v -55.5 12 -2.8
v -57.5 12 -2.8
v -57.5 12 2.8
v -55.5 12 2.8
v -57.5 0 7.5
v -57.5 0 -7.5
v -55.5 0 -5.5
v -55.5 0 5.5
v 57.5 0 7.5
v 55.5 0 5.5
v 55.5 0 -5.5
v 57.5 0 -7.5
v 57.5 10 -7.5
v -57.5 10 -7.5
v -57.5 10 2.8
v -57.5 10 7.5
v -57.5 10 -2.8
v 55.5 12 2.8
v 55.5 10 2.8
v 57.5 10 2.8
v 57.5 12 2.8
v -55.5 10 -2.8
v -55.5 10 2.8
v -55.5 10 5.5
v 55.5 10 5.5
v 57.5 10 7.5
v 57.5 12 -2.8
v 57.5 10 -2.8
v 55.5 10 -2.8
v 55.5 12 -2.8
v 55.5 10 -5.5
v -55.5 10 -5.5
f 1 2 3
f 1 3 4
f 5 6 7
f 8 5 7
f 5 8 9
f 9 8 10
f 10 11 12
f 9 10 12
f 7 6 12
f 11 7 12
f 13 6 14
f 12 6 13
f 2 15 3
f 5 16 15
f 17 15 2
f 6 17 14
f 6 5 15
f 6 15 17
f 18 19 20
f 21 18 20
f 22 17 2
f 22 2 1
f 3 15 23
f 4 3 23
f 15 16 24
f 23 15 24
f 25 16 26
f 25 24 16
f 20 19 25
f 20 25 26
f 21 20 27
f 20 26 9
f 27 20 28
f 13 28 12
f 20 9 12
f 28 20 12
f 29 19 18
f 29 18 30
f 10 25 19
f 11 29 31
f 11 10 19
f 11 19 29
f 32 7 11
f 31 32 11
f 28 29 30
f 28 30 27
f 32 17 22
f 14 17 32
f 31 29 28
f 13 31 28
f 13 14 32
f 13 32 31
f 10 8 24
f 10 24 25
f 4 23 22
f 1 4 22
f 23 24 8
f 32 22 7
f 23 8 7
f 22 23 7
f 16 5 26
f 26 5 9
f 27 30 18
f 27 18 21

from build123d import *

# Parameters (mm, degrees)
SKETCH1_W           = 115
SKETCH1_H           = 15
SKETCH1_W_2         = 111
SKETCH1_H_2         = 11
BOSS_EXTRUDE1_DEPTH = 10
SKETCH2_W           = 2
SKETCH2_H           = 5.6
BOSS_EXTRUDE2_DEPTH = 2


with BuildPart() as part:
    # Sketch1 → Boss-Extrude1 (new body)
    with BuildSketch(Plane(origin=(0, 0, 0), x_dir=(1, 0, 0), z_dir=(0, 1, 0))):
        Rectangle(SKETCH1_W, SKETCH1_H)
        Rectangle(SKETCH1_W_2, SKETCH1_H_2, mode=Mode.SUBTRACT)
    extrude(amount=BOSS_EXTRUDE1_DEPTH)

    # Sketch2 → Boss-Extrude2 (add)
    with BuildSketch(Plane(origin=(0, 10, 0), x_dir=(1, 0, 0), z_dir=(0, 1, 0))):
        with Locations((-56.5, 0)):
            Rectangle(SKETCH2_W, SKETCH2_H)
        with Locations((56.5, 0)):
            Rectangle(SKETCH2_W, SKETCH2_H)
    extrude(amount=BOSS_EXTRUDE2_DEPTH)


solid = part.part
